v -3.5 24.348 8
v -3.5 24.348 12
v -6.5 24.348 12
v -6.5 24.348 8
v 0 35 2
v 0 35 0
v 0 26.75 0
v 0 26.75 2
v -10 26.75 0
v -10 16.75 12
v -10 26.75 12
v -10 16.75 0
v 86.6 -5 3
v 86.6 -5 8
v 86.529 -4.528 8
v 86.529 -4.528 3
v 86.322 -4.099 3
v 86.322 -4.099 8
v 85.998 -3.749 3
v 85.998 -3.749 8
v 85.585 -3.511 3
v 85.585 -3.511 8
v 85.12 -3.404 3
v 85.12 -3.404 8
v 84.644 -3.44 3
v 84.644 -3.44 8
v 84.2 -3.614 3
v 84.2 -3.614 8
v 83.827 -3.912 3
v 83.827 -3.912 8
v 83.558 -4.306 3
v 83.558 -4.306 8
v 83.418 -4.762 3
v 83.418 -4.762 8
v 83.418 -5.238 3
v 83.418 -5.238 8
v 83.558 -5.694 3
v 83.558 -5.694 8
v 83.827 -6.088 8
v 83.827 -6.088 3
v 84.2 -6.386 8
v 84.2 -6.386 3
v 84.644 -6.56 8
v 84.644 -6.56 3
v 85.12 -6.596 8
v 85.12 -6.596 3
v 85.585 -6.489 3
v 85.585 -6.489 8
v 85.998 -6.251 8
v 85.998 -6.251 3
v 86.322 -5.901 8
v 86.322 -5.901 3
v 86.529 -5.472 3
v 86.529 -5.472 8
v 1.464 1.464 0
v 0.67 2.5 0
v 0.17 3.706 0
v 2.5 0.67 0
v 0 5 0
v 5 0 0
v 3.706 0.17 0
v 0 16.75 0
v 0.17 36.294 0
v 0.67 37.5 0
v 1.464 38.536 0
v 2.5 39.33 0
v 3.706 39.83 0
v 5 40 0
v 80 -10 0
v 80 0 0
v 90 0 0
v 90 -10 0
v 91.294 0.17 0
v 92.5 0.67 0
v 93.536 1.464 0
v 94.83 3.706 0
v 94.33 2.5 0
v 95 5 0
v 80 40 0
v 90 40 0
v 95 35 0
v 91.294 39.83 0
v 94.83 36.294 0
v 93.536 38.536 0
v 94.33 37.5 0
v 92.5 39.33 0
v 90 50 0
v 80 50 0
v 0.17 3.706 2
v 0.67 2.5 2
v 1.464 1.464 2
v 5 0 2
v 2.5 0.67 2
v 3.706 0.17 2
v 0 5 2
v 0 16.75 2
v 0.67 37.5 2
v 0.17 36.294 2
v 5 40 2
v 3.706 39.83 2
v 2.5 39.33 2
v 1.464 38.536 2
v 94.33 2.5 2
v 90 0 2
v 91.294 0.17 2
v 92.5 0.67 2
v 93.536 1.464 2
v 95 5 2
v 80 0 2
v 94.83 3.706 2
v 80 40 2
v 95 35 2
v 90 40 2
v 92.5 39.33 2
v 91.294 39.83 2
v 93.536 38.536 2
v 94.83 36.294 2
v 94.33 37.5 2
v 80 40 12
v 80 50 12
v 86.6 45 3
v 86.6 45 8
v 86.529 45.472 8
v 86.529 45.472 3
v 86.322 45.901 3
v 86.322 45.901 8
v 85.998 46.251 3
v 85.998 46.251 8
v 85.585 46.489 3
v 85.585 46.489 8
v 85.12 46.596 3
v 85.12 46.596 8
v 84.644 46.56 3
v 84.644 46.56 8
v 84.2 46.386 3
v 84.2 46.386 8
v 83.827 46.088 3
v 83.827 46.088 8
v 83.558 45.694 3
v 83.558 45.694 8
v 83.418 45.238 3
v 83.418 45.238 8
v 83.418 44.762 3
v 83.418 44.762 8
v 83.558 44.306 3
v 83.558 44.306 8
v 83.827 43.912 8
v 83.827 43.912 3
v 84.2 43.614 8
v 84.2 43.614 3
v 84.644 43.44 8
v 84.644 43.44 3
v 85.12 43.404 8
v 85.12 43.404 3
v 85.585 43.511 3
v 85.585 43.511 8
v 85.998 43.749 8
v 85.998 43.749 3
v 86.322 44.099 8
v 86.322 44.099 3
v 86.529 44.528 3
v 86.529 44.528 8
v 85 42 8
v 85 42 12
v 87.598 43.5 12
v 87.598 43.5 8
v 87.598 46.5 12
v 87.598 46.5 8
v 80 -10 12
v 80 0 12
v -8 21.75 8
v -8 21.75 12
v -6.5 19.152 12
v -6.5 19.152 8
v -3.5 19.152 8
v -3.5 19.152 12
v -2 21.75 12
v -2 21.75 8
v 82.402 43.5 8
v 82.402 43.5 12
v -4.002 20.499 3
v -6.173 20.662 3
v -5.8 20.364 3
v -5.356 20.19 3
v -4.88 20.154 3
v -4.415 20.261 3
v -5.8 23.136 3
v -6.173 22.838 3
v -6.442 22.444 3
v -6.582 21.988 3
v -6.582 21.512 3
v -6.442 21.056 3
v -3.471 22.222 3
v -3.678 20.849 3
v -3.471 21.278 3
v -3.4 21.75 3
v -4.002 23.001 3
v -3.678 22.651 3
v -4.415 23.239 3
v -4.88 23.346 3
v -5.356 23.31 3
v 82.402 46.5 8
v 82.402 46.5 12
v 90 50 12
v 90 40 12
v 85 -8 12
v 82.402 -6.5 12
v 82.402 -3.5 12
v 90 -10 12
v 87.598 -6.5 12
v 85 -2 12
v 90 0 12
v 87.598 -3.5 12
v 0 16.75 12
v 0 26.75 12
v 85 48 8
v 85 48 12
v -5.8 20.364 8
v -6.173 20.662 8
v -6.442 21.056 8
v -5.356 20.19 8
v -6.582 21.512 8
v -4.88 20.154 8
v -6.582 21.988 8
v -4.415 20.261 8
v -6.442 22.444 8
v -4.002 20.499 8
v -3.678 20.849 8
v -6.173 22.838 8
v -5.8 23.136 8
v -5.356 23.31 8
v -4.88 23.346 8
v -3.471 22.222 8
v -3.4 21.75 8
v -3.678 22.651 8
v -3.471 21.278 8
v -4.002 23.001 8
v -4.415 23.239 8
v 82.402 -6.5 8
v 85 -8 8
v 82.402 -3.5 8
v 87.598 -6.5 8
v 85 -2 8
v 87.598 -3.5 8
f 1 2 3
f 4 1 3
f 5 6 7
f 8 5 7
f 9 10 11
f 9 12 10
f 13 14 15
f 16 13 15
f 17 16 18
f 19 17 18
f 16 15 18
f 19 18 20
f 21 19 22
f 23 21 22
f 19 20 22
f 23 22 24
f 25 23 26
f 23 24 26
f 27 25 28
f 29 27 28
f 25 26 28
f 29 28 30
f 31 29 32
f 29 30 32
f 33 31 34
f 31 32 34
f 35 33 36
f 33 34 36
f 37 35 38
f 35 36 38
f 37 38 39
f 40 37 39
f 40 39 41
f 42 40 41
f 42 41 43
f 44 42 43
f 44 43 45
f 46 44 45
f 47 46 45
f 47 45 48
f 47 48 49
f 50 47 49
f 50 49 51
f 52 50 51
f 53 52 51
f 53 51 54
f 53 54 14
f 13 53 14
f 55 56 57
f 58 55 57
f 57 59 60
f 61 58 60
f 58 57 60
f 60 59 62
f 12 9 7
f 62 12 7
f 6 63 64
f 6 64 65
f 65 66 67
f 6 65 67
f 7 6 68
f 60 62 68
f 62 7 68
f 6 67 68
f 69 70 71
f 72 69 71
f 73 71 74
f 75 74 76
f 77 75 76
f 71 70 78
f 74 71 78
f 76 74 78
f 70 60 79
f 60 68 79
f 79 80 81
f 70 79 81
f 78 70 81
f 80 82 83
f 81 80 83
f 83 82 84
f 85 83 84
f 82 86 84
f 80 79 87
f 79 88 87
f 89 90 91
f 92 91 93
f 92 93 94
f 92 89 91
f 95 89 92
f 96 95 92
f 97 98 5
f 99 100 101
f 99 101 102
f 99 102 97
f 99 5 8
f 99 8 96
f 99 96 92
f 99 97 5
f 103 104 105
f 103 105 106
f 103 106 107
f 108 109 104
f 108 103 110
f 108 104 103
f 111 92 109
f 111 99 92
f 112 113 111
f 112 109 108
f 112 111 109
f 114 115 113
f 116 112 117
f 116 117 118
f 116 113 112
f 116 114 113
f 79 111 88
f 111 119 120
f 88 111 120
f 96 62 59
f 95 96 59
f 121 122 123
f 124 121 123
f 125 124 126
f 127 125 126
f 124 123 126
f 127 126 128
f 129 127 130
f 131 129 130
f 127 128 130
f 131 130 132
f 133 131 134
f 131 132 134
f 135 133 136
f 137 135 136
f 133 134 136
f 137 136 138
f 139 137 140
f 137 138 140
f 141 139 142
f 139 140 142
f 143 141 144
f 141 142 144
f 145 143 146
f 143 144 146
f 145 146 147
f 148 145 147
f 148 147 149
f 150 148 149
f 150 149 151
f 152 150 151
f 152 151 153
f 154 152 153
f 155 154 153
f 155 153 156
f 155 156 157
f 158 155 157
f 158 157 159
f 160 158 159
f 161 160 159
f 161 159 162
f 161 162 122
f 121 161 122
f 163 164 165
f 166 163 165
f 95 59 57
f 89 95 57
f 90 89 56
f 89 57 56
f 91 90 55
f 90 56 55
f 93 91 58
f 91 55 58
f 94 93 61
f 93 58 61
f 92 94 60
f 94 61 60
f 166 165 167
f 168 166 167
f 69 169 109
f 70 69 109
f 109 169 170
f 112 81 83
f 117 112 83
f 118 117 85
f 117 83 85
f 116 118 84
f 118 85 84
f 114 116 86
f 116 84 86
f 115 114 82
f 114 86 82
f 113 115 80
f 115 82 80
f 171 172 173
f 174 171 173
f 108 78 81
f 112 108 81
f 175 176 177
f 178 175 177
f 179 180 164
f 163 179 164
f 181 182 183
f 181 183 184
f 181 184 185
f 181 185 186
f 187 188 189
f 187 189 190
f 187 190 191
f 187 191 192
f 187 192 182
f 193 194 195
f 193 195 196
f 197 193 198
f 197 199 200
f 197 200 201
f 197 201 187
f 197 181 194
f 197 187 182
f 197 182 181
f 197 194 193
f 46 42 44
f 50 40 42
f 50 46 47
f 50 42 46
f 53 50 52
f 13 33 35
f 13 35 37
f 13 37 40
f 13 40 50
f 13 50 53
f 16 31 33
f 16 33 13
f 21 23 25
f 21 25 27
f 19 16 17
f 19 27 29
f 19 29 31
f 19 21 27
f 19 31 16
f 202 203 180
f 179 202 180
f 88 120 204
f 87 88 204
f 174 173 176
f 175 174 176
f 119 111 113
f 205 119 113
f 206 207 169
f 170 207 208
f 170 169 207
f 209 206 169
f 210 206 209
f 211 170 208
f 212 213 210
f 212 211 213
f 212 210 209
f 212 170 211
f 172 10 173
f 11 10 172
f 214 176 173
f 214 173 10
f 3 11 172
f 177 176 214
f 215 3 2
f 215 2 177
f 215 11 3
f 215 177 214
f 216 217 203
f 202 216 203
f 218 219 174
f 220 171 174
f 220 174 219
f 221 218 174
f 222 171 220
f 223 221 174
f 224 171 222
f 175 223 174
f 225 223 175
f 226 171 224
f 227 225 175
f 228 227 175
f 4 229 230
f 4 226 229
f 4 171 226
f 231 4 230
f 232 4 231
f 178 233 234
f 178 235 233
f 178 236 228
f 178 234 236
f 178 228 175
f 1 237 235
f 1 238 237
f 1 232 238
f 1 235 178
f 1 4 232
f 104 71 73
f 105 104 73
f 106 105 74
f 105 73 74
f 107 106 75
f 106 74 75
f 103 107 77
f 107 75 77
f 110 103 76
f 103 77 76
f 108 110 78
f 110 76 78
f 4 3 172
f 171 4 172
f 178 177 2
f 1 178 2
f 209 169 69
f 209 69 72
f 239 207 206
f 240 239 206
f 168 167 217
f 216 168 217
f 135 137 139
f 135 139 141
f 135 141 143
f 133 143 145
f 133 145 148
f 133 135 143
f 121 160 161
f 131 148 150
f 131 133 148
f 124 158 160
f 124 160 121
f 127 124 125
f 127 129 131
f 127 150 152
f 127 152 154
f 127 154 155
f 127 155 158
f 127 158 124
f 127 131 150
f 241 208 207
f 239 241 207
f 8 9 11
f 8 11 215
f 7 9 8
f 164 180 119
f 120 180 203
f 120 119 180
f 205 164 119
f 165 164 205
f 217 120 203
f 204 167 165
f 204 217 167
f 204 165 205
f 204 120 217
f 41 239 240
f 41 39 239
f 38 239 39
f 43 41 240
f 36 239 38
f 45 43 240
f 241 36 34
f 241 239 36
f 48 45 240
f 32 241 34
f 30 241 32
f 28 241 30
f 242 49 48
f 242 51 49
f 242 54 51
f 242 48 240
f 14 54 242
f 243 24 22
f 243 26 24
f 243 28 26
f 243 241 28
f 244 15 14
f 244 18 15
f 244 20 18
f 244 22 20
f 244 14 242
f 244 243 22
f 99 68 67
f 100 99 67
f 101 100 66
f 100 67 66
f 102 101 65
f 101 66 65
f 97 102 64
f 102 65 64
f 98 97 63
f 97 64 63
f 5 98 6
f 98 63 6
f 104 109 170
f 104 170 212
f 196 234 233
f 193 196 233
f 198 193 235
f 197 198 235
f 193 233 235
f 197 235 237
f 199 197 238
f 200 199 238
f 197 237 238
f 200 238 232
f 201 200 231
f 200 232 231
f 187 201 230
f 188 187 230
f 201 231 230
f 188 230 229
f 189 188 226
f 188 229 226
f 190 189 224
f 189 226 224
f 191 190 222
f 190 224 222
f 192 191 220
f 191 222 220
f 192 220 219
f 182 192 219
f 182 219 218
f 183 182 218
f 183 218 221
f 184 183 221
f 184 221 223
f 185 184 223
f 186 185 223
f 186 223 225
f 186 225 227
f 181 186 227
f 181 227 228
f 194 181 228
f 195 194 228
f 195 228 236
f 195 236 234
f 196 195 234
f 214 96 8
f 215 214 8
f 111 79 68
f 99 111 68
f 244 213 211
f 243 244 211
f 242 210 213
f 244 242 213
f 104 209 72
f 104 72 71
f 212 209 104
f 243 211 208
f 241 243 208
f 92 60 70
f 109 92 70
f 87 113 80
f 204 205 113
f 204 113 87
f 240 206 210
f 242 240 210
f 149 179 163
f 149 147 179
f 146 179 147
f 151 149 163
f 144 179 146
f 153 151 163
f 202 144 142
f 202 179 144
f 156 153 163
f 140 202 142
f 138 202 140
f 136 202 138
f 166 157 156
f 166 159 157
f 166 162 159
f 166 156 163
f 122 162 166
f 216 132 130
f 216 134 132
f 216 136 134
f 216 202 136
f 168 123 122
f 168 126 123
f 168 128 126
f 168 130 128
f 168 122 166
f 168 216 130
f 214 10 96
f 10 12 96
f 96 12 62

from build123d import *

# Parameters (mm, degrees)
PAD_DEPTH       = 2
SKETCH017_W     = 10
SKETCH017_H     = 10
PAD006_DEPTH    = 2
SKETCH018_W     = 10
SKETCH018_H     = 10
PAD007_DEPTH    = 10
SKETCH020_R     = 1.6
POCKET008_DEPTH = 9
POCKET009_DEPTH = 4


with BuildPart() as part:
    # Sketch → Pad (new body)
    with BuildSketch(Plane.XY):
        with BuildLine():
            Line((5, 0), (90, 0))
            ThreePointArc((90, 0), (93.535534, 1.464466), (95, 5))
            Line((95, 5), (95, 35))
            ThreePointArc((95, 35), (93.535534, 38.535534), (90, 40))
            Line((90, 40), (5, 40))
            ThreePointArc((5, 40), (1.464466, 38.535534), (0, 35))
            Line((0, 35), (0, 5))
            ThreePointArc((0, 5), (1.464466, 1.464466), (5, 0))
        make_face()
    extrude(amount=PAD_DEPTH)

    # Sketch017 (on Face10 of Pad) → Pad006 (join)
    with BuildSketch(Plane.XY.offset(2)):
        with Locations((-5, 21.75)):
            Rectangle(SKETCH017_W, SKETCH017_H)
        with Locations((85, -5)):
            Rectangle(SKETCH017_W, SKETCH017_H)
        with Locations((85, 45)):
            Rectangle(SKETCH017_W, SKETCH017_H)
    extrude(amount=-PAD006_DEPTH)

    # Sketch018 (on Face18 of Pad006) → Pad007 (join)
    with BuildSketch(Plane.XY.offset(2)):
        with Locations((-5, 21.75)):
            Rectangle(SKETCH018_W, SKETCH018_H)
        with Locations((85, -5)):
            Rectangle(SKETCH018_W, SKETCH018_H)
        with Locations((85, 45)):
            Rectangle(SKETCH018_W, SKETCH018_H)
    extrude(amount=PAD007_DEPTH)

    # Sketch020 (on Face29 of Pad007) → Pocket008 (cut)
    with BuildSketch(Plane.XY.offset(12)):
        with Locations((85, -5)):
            Circle(SKETCH020_R)
        with Locations((85, 45)):
            Circle(SKETCH020_R)
        with Locations((-5, 21.75)):
            Circle(SKETCH020_R)
    extrude(amount=-POCKET008_DEPTH, mode=Mode.SUBTRACT)

    # Sketch021 (on Face29 of Pocket008) → Pocket009 (cut)
    with BuildSketch(Plane.XY.offset(12)):
        Polygon((-3.5, 19.151924), (-2, 21.75), (-3.5, 24.348076), (-6.5, 24.348076), (-8, 21.75), (-6.5, 19.151924), align=None)
        Polygon((87.598076, 43.5), (87.598076, 46.5), (85, 48), (82.401924, 46.5), (82.401924, 43.5), (85, 42), align=None)
        Polygon((87.598076, -6.5), (87.598076, -3.5), (85, -2), (82.401924, -3.5), (82.401924, -6.5), (85, -8), align=None)
    extrude(amount=-POCKET009_DEPTH, mode=Mode.SUBTRACT)


solid = part.part
